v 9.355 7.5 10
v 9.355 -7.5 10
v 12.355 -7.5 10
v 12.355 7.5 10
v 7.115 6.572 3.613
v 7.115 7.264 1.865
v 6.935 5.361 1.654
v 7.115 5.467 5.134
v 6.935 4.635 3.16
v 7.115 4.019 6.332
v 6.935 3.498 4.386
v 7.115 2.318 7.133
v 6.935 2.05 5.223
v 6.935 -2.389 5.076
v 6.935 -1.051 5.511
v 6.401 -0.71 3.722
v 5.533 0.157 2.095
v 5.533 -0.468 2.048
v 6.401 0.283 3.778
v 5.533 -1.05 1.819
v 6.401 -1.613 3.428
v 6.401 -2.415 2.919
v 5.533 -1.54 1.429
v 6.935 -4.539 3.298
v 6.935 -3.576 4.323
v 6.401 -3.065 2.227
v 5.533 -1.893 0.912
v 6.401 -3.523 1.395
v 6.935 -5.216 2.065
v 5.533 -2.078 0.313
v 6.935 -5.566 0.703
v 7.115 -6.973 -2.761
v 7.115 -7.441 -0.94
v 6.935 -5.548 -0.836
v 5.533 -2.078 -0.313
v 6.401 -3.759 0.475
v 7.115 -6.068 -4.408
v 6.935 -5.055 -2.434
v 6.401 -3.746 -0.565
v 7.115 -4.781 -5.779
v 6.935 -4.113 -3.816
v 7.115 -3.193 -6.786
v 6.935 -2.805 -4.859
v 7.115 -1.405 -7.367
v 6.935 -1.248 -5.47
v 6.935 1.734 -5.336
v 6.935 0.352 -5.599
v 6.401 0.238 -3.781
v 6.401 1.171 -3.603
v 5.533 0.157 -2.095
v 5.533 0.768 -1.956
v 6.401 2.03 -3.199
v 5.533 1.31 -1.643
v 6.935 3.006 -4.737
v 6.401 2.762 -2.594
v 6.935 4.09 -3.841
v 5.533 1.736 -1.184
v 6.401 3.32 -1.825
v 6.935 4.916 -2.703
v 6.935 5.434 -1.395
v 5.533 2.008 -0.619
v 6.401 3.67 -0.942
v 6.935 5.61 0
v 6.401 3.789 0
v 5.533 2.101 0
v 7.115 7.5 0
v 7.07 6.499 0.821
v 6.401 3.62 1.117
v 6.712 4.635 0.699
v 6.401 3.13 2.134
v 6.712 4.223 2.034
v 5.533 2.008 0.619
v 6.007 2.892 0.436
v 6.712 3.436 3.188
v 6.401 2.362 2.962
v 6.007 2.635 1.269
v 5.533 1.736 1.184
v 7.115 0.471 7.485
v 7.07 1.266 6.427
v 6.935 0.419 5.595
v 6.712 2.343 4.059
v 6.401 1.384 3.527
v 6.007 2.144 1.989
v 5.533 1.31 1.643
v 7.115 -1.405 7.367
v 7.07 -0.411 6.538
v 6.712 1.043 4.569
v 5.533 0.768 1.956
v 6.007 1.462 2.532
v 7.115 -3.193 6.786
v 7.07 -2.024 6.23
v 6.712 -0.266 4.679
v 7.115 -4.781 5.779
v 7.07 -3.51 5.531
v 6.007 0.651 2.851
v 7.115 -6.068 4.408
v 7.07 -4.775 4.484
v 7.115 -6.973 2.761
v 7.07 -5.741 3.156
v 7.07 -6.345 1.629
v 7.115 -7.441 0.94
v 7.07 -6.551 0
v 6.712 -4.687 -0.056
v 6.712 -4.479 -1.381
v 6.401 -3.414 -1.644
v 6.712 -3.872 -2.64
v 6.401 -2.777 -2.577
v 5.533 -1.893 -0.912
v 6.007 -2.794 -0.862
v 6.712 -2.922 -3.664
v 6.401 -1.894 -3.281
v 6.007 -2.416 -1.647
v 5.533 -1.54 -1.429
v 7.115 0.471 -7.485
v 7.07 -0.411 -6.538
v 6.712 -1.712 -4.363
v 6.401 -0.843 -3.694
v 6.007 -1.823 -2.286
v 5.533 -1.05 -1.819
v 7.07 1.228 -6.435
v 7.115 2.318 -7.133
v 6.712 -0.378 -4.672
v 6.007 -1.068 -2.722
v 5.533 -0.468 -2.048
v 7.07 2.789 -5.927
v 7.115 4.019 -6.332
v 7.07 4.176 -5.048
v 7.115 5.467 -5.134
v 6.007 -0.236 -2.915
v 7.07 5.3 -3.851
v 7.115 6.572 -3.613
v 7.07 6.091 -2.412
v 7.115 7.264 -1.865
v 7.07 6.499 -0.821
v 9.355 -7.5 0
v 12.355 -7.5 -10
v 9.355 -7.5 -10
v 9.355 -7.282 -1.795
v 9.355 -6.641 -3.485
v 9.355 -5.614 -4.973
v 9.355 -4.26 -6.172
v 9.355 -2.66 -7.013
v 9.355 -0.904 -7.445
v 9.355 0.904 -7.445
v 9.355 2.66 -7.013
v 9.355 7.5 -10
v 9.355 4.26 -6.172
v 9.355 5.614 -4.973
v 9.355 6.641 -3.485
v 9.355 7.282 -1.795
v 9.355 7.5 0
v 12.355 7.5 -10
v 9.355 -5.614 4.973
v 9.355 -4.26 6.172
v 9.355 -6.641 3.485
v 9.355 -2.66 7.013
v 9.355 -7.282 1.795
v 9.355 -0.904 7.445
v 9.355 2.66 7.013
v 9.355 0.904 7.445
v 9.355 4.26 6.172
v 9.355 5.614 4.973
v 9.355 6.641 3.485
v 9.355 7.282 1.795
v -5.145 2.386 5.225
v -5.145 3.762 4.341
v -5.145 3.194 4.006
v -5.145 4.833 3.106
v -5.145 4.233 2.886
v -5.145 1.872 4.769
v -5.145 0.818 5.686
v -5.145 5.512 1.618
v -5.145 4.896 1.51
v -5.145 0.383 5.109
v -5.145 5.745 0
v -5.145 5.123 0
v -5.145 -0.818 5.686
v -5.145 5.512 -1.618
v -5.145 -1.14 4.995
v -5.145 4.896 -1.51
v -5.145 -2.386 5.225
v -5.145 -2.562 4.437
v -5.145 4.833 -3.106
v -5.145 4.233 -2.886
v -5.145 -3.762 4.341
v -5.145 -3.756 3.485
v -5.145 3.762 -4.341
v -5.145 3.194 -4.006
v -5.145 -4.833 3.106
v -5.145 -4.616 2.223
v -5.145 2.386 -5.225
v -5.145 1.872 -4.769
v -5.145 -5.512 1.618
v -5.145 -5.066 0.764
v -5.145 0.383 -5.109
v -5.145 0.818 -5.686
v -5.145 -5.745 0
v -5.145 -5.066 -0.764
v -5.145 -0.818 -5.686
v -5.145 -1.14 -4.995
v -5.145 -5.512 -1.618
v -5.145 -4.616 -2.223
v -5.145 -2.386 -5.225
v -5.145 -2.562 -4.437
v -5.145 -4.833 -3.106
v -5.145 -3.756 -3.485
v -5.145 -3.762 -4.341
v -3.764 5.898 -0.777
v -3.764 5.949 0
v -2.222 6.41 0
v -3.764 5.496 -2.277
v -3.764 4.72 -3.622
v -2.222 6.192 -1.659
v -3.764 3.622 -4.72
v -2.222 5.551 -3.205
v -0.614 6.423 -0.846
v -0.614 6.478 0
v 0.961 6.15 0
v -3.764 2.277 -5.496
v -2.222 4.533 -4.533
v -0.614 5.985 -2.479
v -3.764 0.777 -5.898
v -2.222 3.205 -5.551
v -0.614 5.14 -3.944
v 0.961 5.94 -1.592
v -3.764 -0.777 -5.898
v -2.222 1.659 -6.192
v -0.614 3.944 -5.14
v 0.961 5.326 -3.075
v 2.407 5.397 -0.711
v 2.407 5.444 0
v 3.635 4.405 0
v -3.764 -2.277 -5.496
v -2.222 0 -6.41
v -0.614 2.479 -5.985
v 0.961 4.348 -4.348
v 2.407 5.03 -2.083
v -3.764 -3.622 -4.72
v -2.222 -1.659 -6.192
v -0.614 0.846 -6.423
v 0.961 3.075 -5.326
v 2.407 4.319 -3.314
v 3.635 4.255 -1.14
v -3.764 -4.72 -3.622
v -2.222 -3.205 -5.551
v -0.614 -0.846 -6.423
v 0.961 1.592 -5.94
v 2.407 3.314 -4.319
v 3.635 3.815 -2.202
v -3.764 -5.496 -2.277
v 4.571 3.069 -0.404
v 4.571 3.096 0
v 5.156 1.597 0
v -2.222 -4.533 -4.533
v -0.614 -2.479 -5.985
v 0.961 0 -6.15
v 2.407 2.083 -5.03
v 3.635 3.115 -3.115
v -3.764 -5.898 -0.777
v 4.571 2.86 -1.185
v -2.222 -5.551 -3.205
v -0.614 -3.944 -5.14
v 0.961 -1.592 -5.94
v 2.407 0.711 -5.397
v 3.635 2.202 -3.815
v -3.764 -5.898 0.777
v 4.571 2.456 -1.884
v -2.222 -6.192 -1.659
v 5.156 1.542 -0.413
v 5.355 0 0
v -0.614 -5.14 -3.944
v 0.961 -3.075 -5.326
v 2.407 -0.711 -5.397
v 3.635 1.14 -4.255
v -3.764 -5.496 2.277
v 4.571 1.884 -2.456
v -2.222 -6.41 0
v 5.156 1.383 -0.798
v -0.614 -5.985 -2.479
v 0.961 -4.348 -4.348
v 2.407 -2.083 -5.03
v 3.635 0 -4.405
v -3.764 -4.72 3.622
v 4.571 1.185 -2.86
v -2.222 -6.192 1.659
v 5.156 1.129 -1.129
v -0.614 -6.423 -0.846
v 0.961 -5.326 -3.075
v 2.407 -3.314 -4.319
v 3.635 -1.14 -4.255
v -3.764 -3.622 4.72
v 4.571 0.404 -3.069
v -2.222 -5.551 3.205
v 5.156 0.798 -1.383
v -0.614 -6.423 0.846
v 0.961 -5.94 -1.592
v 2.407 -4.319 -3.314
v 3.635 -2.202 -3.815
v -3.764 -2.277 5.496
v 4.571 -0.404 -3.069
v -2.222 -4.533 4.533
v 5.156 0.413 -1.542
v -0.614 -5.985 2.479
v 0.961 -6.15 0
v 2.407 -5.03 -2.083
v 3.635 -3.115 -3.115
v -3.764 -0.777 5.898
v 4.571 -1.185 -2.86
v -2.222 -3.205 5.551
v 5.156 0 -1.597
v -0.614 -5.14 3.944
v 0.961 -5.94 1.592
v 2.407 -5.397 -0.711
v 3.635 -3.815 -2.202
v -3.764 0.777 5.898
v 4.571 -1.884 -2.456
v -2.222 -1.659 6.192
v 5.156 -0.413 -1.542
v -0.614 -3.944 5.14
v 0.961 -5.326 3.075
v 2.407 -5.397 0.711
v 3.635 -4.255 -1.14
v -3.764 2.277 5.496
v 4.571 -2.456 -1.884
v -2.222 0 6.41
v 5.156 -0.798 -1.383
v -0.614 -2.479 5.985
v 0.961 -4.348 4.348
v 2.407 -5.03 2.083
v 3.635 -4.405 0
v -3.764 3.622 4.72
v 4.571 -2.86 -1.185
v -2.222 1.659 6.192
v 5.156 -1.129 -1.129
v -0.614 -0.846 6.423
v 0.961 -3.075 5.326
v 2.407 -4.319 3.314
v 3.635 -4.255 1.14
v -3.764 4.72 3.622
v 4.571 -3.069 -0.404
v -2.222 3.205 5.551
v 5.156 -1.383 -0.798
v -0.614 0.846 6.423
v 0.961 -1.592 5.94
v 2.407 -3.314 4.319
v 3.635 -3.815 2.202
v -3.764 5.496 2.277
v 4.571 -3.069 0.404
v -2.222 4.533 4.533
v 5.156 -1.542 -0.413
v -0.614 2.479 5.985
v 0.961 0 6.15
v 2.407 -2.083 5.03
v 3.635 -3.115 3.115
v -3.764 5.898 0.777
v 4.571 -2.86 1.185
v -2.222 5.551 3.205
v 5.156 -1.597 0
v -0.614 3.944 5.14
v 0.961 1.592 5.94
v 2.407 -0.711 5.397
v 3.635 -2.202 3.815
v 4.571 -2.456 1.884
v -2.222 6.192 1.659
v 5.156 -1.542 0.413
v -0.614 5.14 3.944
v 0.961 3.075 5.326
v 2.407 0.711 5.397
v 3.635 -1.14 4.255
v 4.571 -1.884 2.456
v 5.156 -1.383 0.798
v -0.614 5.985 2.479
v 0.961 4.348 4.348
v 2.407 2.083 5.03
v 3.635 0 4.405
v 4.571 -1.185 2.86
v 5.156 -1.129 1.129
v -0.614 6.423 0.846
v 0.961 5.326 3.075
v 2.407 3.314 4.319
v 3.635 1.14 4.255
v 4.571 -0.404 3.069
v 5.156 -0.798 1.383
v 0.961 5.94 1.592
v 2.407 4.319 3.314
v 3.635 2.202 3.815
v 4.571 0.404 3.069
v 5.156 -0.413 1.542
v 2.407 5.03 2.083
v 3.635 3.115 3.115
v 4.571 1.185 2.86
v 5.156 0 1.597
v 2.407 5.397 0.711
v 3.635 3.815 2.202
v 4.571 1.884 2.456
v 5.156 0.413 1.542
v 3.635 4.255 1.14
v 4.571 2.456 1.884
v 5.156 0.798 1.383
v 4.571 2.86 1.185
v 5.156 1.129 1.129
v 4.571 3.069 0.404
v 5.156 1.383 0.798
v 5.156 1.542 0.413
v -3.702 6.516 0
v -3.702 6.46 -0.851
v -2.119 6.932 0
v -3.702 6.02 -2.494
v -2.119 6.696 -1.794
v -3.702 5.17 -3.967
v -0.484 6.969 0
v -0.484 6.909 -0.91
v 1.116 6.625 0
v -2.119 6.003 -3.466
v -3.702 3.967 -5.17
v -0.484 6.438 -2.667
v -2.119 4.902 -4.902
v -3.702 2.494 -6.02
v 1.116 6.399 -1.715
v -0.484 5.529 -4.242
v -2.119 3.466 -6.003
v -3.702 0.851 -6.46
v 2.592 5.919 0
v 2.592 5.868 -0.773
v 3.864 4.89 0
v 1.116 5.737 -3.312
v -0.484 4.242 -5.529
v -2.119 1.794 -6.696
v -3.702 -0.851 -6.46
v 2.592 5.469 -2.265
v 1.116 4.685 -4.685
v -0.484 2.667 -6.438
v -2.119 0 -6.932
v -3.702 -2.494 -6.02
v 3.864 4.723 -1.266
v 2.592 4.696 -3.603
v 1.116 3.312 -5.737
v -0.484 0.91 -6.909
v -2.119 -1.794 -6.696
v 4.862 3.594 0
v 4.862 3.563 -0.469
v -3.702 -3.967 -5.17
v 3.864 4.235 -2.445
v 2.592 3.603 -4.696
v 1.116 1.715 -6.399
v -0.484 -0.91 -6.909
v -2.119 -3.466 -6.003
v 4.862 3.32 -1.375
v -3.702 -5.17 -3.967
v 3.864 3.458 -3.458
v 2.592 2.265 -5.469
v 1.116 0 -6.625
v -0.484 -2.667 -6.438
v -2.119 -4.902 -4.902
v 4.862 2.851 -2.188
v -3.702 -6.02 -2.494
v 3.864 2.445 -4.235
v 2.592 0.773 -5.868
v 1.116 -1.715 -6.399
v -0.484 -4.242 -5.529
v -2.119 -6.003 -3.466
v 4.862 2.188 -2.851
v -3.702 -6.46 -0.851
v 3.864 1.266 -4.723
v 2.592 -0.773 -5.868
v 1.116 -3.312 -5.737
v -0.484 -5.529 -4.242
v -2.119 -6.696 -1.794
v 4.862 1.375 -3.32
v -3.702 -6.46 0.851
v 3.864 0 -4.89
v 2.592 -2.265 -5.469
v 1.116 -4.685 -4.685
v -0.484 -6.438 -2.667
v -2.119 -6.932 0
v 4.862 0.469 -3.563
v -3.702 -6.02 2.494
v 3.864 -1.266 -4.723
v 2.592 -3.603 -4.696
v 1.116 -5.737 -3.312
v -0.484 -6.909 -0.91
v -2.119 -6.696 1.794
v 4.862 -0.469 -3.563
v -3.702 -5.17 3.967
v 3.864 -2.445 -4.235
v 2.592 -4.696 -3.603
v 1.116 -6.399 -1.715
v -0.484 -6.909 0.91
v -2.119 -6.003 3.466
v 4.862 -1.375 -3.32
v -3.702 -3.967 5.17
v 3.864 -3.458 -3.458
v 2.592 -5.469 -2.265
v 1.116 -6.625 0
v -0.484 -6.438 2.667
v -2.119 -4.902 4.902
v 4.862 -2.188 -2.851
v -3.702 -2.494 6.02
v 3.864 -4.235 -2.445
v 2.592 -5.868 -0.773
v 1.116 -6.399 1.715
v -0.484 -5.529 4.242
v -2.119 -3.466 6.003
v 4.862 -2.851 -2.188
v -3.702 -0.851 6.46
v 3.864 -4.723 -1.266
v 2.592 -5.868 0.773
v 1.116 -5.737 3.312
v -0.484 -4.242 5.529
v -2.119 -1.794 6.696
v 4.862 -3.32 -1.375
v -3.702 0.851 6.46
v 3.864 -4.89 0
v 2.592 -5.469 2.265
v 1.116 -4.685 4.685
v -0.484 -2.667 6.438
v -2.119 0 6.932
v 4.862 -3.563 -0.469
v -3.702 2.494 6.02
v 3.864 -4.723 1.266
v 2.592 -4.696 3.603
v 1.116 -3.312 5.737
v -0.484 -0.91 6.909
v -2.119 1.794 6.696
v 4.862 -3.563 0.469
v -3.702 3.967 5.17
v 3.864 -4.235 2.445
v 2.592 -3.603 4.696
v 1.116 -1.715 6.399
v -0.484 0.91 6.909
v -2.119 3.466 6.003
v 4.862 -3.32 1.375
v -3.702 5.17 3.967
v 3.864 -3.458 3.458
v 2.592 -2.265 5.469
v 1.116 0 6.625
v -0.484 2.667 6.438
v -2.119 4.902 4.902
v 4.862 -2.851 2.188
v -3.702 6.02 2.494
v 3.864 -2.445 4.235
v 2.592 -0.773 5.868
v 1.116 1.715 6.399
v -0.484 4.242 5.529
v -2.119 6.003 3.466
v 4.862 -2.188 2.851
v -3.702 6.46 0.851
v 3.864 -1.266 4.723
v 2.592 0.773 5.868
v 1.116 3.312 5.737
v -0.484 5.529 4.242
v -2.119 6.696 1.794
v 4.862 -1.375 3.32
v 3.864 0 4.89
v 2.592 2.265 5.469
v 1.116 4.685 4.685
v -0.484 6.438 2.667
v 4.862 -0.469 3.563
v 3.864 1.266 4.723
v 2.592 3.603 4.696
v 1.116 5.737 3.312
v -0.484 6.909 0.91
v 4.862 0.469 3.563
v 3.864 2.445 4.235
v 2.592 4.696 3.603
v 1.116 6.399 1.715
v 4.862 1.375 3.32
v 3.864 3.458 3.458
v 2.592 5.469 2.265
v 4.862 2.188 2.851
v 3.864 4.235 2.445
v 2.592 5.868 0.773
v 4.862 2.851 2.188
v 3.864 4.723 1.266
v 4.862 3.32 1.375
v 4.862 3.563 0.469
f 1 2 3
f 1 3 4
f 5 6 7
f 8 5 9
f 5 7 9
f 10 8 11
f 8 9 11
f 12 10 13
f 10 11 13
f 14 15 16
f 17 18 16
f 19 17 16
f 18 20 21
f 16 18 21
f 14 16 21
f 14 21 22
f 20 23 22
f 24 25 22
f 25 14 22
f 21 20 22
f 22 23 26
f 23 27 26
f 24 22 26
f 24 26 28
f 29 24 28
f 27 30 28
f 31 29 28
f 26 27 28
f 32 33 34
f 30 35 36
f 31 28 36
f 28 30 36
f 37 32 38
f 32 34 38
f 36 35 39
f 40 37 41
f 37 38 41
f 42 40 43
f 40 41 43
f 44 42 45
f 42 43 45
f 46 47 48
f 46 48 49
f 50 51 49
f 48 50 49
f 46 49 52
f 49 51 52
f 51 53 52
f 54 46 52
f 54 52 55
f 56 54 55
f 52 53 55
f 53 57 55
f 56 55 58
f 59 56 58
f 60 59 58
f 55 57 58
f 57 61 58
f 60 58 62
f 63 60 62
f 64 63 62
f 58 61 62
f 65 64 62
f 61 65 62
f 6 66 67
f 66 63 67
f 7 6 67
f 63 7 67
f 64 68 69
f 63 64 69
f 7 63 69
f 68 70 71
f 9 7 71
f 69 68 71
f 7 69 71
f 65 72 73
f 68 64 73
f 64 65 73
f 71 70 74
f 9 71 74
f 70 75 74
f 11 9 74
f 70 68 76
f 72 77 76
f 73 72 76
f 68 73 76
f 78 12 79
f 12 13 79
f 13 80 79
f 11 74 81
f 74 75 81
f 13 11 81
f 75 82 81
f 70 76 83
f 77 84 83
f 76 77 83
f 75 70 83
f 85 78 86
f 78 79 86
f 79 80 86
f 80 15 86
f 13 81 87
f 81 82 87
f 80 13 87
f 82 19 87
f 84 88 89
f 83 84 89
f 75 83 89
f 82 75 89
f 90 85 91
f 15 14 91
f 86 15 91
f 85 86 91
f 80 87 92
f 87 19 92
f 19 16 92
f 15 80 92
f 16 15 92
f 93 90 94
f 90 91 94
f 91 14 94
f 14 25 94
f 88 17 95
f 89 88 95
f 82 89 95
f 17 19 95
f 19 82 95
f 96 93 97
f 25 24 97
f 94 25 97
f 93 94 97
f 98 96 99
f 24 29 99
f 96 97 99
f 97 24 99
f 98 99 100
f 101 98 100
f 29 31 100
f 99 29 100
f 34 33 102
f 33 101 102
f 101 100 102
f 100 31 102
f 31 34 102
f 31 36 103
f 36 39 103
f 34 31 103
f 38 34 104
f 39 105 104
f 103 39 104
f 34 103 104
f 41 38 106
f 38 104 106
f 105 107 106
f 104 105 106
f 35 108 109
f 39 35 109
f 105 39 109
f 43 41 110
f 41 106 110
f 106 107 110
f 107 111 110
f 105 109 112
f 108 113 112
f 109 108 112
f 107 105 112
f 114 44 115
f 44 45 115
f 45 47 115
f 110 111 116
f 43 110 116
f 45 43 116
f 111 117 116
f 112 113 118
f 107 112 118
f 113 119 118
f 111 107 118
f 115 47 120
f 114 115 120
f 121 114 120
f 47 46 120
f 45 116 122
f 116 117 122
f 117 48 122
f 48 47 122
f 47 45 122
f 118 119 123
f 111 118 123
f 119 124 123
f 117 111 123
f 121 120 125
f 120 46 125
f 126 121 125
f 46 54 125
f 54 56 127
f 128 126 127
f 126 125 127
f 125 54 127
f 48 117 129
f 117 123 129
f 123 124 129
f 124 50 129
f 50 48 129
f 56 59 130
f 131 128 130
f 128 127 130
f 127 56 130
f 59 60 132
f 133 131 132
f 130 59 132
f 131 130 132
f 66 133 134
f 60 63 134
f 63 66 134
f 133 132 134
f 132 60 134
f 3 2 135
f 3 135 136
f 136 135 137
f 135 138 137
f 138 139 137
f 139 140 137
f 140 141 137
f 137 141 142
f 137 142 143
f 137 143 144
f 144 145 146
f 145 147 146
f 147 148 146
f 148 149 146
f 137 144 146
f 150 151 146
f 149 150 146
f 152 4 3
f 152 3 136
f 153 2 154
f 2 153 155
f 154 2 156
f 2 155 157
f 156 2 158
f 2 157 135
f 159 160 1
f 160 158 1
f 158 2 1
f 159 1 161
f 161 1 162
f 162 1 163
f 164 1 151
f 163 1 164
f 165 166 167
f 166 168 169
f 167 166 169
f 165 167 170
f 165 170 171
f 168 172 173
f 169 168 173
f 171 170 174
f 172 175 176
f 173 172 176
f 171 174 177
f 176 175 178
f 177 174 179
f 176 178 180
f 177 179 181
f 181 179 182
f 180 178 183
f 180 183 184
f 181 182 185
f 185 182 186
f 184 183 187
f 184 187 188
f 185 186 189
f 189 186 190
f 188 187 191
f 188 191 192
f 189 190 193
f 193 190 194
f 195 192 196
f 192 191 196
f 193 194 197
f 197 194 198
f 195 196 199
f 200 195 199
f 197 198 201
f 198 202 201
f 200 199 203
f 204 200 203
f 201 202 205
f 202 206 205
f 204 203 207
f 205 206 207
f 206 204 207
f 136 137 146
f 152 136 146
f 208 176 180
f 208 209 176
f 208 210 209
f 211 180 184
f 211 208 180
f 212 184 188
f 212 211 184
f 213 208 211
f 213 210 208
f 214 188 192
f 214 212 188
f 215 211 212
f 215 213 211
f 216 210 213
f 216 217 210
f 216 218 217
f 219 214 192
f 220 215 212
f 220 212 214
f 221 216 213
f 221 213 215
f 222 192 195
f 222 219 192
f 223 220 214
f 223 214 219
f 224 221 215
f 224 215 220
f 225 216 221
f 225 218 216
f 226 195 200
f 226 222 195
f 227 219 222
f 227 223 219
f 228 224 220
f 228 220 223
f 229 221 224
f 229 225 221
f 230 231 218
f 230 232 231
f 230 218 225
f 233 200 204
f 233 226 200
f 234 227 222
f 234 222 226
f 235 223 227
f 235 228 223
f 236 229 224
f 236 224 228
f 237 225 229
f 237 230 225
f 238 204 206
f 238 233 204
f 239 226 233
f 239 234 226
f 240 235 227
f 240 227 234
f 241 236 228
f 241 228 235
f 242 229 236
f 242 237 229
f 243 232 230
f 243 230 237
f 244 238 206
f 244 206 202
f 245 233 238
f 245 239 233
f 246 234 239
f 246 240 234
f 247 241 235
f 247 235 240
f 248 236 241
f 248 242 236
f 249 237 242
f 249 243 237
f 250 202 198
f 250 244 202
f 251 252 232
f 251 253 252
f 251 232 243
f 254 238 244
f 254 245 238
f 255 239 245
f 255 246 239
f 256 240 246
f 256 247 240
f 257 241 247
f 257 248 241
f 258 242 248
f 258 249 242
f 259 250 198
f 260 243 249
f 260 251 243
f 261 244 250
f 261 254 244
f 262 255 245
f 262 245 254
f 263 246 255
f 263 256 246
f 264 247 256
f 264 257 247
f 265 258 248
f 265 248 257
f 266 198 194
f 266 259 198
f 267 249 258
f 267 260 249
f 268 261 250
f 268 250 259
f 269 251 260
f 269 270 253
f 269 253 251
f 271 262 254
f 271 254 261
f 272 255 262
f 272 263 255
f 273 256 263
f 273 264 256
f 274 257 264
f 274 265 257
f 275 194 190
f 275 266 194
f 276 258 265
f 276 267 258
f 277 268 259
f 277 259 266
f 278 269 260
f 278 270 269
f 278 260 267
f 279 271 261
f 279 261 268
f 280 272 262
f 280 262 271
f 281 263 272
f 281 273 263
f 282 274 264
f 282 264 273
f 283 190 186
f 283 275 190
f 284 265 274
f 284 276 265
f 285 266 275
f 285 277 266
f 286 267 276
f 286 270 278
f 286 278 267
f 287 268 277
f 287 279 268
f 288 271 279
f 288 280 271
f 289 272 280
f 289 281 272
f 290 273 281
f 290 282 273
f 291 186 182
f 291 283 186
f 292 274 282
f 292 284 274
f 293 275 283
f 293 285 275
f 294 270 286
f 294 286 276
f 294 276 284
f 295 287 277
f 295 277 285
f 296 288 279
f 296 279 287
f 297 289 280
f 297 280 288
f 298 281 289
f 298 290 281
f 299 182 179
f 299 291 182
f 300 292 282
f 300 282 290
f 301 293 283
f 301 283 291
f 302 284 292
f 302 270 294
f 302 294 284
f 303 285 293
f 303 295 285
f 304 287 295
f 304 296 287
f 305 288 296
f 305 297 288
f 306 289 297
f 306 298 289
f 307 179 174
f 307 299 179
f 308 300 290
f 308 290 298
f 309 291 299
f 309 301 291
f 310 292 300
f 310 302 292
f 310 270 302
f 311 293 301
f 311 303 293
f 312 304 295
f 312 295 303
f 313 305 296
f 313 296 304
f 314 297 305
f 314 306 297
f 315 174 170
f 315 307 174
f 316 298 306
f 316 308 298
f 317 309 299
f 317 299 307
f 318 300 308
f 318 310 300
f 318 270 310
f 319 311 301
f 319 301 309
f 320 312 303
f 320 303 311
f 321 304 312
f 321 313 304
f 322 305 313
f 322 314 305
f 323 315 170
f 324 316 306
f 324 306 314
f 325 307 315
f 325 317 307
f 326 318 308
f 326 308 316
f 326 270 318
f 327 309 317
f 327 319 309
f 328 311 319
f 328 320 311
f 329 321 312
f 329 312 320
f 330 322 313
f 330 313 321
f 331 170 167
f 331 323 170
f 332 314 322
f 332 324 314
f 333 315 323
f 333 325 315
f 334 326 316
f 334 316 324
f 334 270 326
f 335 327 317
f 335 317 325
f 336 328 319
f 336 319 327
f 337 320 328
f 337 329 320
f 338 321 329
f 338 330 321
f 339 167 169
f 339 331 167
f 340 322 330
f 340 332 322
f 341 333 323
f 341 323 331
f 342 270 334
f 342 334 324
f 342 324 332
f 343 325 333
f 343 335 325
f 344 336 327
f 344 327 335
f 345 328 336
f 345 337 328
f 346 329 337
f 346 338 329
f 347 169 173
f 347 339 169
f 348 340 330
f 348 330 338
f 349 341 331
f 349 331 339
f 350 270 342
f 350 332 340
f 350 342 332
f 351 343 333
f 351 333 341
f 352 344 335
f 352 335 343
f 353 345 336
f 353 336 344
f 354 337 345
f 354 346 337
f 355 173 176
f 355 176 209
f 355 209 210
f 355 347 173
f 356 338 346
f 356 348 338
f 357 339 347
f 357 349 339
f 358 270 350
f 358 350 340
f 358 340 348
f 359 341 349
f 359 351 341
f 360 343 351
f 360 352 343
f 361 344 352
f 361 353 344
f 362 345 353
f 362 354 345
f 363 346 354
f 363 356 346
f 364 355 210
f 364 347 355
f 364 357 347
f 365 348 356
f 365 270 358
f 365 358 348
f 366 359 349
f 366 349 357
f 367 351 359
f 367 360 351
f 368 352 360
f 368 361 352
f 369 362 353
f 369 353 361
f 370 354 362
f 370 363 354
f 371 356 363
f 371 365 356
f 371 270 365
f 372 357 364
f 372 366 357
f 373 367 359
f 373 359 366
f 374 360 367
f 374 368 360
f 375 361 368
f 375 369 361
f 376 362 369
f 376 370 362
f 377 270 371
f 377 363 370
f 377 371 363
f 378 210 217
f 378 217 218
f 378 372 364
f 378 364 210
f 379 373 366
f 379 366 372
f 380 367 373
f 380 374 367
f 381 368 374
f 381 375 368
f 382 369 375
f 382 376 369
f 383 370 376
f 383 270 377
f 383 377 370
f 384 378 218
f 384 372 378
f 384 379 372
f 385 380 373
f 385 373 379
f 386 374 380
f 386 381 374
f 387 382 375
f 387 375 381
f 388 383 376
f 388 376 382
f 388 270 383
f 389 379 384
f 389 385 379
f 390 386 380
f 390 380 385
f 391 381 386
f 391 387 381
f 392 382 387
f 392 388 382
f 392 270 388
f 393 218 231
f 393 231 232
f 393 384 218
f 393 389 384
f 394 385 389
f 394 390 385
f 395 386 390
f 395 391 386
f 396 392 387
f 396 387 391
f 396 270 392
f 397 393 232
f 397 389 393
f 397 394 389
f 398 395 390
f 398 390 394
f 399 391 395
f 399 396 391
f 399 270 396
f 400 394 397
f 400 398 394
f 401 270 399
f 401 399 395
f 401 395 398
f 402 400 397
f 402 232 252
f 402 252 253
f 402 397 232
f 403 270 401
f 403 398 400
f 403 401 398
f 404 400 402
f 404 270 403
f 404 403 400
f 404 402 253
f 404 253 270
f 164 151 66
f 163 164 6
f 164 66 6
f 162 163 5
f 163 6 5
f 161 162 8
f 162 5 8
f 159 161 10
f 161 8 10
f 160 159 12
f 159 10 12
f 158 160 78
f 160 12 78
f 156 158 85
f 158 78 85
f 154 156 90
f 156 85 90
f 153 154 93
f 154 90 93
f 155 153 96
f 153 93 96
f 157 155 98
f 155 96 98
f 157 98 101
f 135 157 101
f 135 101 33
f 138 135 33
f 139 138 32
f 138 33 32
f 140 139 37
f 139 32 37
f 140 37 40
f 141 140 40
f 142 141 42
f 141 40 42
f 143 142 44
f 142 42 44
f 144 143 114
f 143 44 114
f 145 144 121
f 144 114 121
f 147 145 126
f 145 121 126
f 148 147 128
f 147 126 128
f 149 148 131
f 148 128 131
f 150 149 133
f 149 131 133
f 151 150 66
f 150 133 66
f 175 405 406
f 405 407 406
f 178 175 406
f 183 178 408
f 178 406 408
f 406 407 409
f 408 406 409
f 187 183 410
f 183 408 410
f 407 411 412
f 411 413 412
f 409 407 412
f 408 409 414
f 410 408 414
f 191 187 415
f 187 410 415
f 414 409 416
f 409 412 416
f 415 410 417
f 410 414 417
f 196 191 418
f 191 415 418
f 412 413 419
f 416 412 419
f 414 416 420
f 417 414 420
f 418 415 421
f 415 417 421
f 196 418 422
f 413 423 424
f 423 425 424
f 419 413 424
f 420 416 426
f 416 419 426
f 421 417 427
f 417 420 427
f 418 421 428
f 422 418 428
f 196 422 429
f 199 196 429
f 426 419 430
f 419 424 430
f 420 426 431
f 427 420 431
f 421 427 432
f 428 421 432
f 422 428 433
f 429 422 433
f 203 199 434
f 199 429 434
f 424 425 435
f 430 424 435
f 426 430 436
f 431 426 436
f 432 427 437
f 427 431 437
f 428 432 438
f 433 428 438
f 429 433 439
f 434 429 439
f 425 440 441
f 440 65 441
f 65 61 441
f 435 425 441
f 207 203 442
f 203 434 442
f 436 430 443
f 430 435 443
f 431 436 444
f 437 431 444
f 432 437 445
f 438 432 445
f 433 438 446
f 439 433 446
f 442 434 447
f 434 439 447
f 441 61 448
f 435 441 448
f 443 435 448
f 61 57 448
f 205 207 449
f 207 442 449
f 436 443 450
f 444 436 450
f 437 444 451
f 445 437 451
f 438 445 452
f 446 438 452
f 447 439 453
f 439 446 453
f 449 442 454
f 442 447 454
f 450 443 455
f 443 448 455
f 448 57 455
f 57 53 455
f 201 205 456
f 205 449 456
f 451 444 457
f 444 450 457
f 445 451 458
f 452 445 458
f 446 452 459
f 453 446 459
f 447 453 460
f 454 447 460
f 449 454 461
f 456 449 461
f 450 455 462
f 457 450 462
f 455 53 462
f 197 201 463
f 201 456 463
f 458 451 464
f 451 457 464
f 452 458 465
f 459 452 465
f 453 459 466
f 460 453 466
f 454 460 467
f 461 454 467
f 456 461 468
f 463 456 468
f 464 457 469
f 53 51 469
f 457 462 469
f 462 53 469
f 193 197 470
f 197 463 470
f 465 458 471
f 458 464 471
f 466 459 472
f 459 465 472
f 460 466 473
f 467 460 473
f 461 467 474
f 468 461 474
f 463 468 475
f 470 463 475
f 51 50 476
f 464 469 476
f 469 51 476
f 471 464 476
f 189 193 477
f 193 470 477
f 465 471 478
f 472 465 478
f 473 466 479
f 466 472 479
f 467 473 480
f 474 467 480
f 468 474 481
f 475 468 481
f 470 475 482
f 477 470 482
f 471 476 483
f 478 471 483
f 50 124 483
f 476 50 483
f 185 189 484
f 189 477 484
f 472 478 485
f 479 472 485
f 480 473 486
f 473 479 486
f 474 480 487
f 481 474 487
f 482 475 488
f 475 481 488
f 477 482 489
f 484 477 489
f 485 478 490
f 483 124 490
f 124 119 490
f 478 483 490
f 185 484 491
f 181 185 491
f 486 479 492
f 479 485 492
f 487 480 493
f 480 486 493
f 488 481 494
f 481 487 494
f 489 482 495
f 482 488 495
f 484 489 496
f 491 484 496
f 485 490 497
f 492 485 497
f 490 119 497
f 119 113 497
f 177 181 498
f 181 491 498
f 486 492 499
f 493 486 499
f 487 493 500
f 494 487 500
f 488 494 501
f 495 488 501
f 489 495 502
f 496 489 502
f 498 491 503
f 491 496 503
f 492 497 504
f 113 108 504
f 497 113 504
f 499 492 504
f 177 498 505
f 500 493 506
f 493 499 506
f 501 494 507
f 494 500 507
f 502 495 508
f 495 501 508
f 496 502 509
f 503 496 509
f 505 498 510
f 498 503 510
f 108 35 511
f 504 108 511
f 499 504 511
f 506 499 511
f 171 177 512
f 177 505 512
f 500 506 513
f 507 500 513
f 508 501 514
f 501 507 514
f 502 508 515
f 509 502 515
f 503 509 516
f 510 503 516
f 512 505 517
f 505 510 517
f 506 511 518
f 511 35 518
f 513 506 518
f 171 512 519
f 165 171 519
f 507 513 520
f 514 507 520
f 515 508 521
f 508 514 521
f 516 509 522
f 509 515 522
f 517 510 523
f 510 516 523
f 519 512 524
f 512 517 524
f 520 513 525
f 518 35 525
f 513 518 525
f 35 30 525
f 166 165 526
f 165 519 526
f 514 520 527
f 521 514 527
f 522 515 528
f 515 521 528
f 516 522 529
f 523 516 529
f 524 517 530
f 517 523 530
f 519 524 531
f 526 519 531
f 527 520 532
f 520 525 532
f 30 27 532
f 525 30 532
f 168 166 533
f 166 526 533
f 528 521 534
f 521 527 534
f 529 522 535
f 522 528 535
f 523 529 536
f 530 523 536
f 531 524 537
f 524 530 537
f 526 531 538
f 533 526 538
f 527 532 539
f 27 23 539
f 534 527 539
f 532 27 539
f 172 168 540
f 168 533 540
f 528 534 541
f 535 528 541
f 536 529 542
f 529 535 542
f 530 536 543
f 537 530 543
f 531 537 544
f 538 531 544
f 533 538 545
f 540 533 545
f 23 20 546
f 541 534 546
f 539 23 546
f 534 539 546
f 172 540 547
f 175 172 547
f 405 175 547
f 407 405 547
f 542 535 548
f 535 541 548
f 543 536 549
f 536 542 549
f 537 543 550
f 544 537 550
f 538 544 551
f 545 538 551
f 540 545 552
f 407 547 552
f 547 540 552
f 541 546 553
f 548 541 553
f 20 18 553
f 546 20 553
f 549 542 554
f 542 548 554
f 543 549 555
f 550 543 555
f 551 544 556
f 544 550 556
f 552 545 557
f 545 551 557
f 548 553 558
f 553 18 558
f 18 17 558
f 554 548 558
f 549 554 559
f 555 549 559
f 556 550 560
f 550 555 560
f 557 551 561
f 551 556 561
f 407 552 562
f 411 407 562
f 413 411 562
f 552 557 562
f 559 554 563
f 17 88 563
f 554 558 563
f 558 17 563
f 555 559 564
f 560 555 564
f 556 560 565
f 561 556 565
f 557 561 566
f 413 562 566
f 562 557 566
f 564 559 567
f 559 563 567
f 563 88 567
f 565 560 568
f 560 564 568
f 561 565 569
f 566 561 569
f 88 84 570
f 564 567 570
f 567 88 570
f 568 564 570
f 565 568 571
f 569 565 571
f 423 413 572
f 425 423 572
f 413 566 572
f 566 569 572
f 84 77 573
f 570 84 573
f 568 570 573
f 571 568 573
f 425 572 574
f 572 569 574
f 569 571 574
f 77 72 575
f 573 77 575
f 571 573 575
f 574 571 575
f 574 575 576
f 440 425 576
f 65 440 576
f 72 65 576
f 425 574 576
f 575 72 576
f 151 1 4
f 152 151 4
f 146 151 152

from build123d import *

# Parameters (mm, degrees)
VACIADO1_T              = -0.5
CROQUIS3_W              = 20
CROQUIS3_H              = 15
SALIENTE_EXTRUIR1_DEPTH = 3


with BuildPart() as part:
    # Croquis1 → Revolución1 (revolve)
    with BuildSketch(Plane.XY):
        with BuildLine():
            Line((5.855337127, 0), (-5.144662873, 0))
            Line((-5.144662873, 0), (-5.144662873, 5.744562647))
            ThreePointArc((-5.144662873, 5.744562647), (2.095707476, 6.204836823), (5.855337127, 0))
        make_face()
    revolve(axis=Axis((5.855337127, 0, 0), (-1, 0, 0)))

    # Vaciado1
    vaciado1_openings = [part.faces().sort_by_distance(p)[0] for p in [
        (-5.144662873, 0, 0),
    ]]
    offset(amount=VACIADO1_T, openings=vaciado1_openings, kind=Kind.INTERSECTION)

    # Croquis2 → Revolución2 (revolve)
    with BuildSketch(Plane.XY, mode=Mode.PRIVATE) as revoluci_n2_sk:
        with BuildLine():
            Line((5.855337127, 0), (9.355337127, 0))
            Line((9.355337127, 0), (9.355337127, -7.5))
            Line((9.355337127, -7.5), (7.115337127, -7.5))
            ThreePointArc((7.115337127, -7.5), (6.711500505, -4.686879238), (5.532607443, -2.100966713))
            Line((5.532607443, -2.100966713), (5.855337127, 0))
        make_face()
    revolve(revoluci_n2_sk.sketch.rotate(Axis((0, 0, 0), (1, 0, 0)), 180), axis=Axis((0, 0, 0), (1, 0, 0)))

    # Croquis3 → Saliente-Extruir1 (add)
    with BuildSketch(Plane(origin=(9.355337127, 0, 0), x_dir=(0, 0, -1), z_dir=(1, 0, 0))):
        Rectangle(CROQUIS3_W, CROQUIS3_H)
    extrude(amount=SALIENTE_EXTRUIR1_DEPTH)


solid = part.part
